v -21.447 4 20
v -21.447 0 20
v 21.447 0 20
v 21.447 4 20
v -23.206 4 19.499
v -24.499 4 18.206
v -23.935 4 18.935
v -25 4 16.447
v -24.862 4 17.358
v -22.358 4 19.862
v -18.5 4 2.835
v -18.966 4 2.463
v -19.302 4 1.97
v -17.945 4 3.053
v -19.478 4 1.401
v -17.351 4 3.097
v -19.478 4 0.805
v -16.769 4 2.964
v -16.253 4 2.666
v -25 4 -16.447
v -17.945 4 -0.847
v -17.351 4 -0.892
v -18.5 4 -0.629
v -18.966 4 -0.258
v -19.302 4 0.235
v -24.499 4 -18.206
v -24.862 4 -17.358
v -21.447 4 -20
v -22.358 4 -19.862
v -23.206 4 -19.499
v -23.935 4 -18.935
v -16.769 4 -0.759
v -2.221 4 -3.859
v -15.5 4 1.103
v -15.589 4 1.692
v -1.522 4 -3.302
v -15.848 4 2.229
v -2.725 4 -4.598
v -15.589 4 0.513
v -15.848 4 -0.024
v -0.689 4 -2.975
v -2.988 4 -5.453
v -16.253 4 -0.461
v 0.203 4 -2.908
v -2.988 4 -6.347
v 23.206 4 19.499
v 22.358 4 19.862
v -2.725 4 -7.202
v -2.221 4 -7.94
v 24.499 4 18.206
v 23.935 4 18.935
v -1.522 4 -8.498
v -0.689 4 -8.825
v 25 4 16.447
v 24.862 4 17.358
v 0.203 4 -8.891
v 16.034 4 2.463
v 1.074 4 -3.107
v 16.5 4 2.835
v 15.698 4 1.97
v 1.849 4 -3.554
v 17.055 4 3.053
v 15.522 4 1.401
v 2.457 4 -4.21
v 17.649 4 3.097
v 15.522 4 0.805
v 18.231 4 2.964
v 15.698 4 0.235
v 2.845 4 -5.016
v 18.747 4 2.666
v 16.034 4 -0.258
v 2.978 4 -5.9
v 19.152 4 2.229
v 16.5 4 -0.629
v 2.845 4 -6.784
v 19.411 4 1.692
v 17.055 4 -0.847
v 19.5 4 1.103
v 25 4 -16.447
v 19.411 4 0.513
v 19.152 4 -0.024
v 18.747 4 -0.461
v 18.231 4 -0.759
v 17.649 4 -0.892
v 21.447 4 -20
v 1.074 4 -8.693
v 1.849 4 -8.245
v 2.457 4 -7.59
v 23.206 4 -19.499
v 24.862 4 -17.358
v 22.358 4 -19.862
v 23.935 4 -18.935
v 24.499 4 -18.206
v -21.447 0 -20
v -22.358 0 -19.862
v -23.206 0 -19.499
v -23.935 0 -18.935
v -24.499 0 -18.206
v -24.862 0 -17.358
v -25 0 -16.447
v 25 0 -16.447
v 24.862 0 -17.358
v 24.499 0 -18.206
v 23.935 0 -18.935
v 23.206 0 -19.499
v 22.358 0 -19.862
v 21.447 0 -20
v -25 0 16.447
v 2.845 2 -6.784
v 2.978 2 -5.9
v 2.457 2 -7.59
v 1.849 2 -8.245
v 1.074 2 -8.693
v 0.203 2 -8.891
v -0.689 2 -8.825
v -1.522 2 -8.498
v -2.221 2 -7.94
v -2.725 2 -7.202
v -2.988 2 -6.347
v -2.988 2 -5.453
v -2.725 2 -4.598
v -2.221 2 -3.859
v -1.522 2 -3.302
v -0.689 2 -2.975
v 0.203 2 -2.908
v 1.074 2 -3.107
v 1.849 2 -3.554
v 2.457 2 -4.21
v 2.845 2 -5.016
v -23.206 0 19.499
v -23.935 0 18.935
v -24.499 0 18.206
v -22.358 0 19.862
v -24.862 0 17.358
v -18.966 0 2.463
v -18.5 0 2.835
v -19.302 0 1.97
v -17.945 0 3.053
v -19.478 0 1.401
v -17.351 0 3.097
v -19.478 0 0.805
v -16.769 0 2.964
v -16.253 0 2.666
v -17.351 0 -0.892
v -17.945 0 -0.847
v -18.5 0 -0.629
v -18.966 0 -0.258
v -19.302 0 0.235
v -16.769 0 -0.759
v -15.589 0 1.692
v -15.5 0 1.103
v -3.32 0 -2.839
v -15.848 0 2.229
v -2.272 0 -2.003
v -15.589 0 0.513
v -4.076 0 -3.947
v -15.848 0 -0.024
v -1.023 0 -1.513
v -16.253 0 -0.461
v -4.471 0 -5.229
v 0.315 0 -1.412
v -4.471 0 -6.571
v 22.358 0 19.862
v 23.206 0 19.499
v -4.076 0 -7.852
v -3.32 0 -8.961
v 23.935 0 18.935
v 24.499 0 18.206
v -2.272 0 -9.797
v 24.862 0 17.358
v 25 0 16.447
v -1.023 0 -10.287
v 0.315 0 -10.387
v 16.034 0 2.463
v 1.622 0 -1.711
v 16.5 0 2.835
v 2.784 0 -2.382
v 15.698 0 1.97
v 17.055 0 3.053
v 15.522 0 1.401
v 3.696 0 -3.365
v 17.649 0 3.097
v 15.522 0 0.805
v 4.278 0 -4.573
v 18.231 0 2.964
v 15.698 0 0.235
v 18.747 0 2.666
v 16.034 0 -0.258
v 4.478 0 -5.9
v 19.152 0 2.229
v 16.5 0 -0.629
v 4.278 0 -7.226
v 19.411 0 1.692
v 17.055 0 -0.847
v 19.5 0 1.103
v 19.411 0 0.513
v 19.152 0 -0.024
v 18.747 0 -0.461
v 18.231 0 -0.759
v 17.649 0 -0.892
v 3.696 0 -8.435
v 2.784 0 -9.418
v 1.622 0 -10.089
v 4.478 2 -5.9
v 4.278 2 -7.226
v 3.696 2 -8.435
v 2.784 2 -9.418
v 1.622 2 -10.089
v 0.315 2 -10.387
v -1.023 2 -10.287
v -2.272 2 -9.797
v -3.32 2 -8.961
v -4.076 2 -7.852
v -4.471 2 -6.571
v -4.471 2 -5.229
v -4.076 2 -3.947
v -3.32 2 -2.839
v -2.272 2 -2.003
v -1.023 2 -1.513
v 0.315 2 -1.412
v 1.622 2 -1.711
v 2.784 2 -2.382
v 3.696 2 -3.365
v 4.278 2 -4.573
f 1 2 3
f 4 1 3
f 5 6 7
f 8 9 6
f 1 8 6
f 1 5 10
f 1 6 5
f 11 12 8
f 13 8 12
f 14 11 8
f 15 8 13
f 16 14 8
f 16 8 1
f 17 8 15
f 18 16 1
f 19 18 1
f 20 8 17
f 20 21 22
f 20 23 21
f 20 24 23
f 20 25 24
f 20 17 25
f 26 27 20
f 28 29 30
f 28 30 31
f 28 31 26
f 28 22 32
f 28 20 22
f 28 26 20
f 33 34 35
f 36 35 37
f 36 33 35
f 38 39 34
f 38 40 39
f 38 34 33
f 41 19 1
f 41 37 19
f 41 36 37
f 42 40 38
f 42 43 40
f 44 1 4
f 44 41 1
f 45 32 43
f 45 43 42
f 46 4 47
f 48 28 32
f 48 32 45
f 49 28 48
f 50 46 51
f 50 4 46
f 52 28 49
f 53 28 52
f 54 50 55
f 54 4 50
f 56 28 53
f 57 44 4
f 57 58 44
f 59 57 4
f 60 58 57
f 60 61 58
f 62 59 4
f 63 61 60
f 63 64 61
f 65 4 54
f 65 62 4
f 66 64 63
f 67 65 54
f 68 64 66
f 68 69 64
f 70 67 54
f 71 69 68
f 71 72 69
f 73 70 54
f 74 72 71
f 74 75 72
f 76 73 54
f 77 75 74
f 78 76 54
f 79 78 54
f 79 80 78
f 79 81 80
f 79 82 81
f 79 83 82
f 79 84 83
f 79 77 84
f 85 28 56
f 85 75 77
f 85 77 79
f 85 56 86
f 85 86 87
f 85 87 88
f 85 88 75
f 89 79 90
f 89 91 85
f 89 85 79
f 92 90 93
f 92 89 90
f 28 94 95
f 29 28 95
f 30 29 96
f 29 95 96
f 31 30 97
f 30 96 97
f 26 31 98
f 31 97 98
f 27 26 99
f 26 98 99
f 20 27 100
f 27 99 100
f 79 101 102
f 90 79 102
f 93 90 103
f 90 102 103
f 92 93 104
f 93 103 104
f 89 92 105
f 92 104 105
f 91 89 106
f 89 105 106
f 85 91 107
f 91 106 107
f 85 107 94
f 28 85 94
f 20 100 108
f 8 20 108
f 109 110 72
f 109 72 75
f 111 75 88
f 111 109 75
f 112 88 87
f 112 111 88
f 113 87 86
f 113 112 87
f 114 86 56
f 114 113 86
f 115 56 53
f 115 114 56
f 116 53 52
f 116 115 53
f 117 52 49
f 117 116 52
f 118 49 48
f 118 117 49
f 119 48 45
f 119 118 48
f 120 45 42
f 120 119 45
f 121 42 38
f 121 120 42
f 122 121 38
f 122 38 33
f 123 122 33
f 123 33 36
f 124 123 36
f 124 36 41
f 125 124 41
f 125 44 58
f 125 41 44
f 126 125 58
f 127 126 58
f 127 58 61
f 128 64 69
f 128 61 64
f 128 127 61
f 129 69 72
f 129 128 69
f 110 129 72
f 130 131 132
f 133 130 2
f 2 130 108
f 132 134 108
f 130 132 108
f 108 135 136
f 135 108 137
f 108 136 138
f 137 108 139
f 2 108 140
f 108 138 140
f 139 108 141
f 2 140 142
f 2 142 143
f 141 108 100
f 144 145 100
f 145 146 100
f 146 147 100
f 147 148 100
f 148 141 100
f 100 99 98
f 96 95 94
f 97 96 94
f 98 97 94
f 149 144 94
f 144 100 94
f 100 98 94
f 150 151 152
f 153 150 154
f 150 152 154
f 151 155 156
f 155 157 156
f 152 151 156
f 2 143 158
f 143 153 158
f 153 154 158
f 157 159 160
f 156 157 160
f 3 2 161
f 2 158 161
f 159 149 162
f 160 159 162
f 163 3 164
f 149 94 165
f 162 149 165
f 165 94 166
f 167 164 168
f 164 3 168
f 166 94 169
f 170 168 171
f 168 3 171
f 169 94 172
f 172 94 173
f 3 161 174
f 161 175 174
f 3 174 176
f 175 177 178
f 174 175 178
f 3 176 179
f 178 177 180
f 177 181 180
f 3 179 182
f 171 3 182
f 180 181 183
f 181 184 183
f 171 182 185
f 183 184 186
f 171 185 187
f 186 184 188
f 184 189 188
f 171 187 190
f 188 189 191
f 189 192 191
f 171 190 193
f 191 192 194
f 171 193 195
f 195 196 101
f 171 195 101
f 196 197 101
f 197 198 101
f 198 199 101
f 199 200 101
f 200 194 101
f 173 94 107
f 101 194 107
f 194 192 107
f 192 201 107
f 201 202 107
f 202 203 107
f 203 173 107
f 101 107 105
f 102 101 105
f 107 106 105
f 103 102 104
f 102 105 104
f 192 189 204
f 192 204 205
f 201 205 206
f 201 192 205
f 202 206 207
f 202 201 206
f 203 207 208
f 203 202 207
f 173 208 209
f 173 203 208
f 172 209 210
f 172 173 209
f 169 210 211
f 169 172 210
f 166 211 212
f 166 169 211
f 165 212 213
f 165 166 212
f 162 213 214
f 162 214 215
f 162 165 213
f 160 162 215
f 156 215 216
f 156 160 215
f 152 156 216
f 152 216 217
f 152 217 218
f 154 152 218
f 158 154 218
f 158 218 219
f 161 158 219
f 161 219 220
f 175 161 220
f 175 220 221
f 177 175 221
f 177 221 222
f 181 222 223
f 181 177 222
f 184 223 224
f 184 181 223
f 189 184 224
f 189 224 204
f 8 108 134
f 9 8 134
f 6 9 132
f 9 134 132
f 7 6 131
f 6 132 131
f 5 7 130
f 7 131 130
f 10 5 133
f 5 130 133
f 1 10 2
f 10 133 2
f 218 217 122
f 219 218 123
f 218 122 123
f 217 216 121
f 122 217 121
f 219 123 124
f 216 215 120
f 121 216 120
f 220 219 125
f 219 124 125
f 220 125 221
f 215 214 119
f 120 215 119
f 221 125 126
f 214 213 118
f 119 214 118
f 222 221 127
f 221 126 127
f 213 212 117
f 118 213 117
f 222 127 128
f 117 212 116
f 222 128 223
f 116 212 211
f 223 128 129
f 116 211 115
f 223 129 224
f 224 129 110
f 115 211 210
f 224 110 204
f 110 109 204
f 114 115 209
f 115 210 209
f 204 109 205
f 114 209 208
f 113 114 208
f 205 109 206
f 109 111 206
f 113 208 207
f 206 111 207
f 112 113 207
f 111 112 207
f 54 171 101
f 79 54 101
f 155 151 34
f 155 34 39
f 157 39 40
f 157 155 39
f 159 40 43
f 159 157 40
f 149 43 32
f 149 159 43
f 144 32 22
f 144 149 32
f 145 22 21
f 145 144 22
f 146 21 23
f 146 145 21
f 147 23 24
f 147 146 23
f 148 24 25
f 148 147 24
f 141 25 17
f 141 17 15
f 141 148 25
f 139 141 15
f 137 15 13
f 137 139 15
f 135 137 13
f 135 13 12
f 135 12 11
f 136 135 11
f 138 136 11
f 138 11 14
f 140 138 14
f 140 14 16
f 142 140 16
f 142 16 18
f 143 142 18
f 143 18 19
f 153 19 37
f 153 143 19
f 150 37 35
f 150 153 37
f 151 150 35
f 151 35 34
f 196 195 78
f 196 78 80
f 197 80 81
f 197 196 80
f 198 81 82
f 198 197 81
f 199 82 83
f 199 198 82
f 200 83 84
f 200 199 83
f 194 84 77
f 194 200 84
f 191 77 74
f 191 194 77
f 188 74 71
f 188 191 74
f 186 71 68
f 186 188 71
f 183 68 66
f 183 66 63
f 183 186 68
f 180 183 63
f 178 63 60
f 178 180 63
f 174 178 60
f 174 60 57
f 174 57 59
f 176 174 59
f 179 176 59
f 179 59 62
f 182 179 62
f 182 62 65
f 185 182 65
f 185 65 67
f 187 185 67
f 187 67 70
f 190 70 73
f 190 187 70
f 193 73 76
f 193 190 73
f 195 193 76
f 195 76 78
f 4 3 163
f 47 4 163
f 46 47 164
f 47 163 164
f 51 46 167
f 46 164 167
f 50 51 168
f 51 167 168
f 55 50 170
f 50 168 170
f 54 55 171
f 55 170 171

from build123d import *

# Parameters (mm, degrees)
SKETCH1_R           = 2
BOSS_EXTRUDE2_DEPTH = 4
SKETCH1_14_R        = 3
CUT_EXTRUDE2_DEPTH  = 33.26453161
SKETCH1_15_R        = 4.5
CUT_EXTRUDE3_DEPTH  = 2


with BuildPart() as part:
    # Sketch1 → Boss-Extrude2 (new body)
    with BuildSketch(Plane(origin=(0, 0, 0), x_dir=(1, 0, 0), z_dir=(0, 1, 0))):
        with BuildLine():
            Line((21.446973136, 20), (-21.446973136, 20))
            ThreePointArc((-21.446973136, 20), (-23.935145745, 18.935145745), (-25, 16.446973136))
            Line((-25, 16.446973136), (-25, -16.446973136))
            ThreePointArc((-25, -16.446973136), (-23.935145745, -18.935145745), (-21.446973136, -20))
            Line((-21.446973136, -20), (21.446973136, -20))
            ThreePointArc((21.446973136, -20), (23.935145745, -18.935145745), (25, -16.446973136))
            Line((25, -16.446973136), (25, 16.446973136))
            ThreePointArc((25, 16.446973136), (23.935145745, 18.935145745), (21.446973136, 20))
        make_face()
        with Locations((-17.5, -1.102660735)):
            Circle(SKETCH1_R, mode=Mode.SUBTRACT)
        with Locations((17.5, -1.102660735)):
            Circle(SKETCH1_R, mode=Mode.SUBTRACT)
    extrude(amount=BOSS_EXTRUDE2_DEPTH)

    # Sketch1<14> → Cut-Extrude2 (cut, through all)
    with BuildSketch(Plane(origin=(0, 0, 0), x_dir=(1, 0, 0), z_dir=(0, 1, 0))):
        with Locations((-0.021660512, 5.8998827)):
            Circle(SKETCH1_14_R)
    extrude(amount=CUT_EXTRUDE2_DEPTH, mode=Mode.SUBTRACT)

    # Sketch1<15> → Cut-Extrude3 (cut)
    with BuildSketch(Plane(origin=(0, 0, 0), x_dir=(1, 0, 0), z_dir=(0, 1, 0))):
        with Locations((-0.021660512, 5.8998827)):
            Circle(SKETCH1_15_R)
    extrude(amount=CUT_EXTRUDE3_DEPTH, mode=Mode.SUBTRACT)


solid = part.part
